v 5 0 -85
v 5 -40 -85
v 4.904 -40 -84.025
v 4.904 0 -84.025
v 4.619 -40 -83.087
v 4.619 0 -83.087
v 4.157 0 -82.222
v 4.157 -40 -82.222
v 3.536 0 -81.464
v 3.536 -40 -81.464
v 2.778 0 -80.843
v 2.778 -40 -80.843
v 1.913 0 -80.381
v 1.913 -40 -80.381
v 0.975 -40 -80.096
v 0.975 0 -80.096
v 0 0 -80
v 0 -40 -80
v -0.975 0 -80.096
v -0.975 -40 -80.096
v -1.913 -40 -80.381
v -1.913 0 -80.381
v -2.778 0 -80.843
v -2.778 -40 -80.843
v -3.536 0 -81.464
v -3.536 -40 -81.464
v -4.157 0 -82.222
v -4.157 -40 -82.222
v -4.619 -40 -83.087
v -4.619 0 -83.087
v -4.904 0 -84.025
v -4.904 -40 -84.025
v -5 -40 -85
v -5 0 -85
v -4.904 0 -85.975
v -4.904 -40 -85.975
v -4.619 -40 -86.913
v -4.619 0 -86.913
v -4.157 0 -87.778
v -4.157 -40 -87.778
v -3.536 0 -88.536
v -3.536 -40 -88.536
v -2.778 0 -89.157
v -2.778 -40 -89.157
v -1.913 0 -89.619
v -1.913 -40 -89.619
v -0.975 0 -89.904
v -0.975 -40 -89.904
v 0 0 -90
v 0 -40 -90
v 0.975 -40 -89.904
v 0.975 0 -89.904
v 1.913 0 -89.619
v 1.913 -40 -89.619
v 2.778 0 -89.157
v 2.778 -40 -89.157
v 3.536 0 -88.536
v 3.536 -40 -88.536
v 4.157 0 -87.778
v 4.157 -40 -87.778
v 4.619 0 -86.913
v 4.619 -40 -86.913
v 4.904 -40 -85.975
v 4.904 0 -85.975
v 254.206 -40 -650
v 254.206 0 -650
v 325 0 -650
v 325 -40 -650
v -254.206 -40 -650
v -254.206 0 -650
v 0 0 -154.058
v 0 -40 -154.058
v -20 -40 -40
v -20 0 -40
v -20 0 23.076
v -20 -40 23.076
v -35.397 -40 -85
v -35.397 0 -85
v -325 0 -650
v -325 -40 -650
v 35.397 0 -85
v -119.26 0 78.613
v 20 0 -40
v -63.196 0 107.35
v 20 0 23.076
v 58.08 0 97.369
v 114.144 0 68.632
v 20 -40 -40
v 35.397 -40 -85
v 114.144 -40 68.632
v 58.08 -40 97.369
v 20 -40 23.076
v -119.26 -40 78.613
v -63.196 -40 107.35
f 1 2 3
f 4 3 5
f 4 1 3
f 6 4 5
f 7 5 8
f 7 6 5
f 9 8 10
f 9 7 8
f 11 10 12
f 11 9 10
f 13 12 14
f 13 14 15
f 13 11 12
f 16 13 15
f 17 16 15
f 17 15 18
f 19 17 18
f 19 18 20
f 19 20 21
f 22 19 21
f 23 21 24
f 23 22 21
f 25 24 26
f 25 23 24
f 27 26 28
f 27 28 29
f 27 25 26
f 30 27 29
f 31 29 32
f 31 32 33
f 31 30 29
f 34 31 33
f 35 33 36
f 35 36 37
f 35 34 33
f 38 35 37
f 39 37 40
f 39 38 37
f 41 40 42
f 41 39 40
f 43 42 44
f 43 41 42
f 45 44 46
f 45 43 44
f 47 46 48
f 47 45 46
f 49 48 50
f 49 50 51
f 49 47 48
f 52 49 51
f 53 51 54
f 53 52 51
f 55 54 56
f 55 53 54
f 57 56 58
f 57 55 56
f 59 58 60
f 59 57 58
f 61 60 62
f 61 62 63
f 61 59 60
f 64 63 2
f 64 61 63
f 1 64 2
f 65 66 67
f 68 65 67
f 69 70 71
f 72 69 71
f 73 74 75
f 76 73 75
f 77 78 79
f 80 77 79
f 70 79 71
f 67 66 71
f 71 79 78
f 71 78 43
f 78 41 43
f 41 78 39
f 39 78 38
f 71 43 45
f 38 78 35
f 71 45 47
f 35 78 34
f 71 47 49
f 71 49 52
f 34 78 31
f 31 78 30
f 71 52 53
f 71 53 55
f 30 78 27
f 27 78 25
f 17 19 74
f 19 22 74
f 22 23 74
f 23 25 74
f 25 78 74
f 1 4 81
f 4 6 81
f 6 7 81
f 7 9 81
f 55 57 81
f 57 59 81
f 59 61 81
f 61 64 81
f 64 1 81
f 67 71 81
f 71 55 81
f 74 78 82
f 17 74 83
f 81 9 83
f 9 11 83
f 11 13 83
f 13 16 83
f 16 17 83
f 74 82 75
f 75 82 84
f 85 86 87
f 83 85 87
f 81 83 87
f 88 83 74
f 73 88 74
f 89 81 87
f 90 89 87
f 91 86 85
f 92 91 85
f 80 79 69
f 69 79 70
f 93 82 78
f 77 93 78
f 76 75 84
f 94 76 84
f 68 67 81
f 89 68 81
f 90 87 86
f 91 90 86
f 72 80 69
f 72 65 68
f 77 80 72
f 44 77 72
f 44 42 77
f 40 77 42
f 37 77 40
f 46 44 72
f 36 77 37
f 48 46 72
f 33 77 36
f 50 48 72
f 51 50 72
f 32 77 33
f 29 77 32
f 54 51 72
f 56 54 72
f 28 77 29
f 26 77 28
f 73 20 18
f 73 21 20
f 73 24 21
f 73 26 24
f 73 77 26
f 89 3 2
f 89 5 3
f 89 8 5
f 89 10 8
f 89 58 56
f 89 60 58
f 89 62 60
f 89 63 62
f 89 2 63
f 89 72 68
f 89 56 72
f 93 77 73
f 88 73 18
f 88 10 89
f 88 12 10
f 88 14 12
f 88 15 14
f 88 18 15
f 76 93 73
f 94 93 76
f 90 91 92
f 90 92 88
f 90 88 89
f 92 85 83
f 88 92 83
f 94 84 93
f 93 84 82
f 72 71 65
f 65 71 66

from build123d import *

# Parameters (mm, degrees)
F0_R     = 5
F1_DEPTH = 40


with BuildPart() as f1:
    # F0 (on Front) → F1 (new body)
    with BuildSketch(Plane.XZ):
        Polygon((-20, 23.076462), (-63.196195, 107.349918), (-119.260357, 78.613011), (-35.396944, -85), (-12.331214, -40), (-20, -40), align=None)
        Polygon((-12.331214, -40), (-35.396944, -85), (0, -154.057537), (35.396944, -85), (12.331214, -40), align=None)
        with Locations((0, -85)):
            Circle(F0_R, mode=Mode.SUBTRACT)
        Polygon((0, -154.057537), (-35.396944, -85), (-325, -650), (-254.206111, -650), align=None)
        Polygon((35.396944, -85), (0, -154.057537), (254.206111, -650), (325, -650), align=None)
        Polygon((20, -40), (12.331214, -40), (35.396944, -85), (114.1444, 68.632054), (58.080238, 97.368961), (20, 23.076462), align=None)
    extrude(amount=F1_DEPTH)


solid = f1.part
